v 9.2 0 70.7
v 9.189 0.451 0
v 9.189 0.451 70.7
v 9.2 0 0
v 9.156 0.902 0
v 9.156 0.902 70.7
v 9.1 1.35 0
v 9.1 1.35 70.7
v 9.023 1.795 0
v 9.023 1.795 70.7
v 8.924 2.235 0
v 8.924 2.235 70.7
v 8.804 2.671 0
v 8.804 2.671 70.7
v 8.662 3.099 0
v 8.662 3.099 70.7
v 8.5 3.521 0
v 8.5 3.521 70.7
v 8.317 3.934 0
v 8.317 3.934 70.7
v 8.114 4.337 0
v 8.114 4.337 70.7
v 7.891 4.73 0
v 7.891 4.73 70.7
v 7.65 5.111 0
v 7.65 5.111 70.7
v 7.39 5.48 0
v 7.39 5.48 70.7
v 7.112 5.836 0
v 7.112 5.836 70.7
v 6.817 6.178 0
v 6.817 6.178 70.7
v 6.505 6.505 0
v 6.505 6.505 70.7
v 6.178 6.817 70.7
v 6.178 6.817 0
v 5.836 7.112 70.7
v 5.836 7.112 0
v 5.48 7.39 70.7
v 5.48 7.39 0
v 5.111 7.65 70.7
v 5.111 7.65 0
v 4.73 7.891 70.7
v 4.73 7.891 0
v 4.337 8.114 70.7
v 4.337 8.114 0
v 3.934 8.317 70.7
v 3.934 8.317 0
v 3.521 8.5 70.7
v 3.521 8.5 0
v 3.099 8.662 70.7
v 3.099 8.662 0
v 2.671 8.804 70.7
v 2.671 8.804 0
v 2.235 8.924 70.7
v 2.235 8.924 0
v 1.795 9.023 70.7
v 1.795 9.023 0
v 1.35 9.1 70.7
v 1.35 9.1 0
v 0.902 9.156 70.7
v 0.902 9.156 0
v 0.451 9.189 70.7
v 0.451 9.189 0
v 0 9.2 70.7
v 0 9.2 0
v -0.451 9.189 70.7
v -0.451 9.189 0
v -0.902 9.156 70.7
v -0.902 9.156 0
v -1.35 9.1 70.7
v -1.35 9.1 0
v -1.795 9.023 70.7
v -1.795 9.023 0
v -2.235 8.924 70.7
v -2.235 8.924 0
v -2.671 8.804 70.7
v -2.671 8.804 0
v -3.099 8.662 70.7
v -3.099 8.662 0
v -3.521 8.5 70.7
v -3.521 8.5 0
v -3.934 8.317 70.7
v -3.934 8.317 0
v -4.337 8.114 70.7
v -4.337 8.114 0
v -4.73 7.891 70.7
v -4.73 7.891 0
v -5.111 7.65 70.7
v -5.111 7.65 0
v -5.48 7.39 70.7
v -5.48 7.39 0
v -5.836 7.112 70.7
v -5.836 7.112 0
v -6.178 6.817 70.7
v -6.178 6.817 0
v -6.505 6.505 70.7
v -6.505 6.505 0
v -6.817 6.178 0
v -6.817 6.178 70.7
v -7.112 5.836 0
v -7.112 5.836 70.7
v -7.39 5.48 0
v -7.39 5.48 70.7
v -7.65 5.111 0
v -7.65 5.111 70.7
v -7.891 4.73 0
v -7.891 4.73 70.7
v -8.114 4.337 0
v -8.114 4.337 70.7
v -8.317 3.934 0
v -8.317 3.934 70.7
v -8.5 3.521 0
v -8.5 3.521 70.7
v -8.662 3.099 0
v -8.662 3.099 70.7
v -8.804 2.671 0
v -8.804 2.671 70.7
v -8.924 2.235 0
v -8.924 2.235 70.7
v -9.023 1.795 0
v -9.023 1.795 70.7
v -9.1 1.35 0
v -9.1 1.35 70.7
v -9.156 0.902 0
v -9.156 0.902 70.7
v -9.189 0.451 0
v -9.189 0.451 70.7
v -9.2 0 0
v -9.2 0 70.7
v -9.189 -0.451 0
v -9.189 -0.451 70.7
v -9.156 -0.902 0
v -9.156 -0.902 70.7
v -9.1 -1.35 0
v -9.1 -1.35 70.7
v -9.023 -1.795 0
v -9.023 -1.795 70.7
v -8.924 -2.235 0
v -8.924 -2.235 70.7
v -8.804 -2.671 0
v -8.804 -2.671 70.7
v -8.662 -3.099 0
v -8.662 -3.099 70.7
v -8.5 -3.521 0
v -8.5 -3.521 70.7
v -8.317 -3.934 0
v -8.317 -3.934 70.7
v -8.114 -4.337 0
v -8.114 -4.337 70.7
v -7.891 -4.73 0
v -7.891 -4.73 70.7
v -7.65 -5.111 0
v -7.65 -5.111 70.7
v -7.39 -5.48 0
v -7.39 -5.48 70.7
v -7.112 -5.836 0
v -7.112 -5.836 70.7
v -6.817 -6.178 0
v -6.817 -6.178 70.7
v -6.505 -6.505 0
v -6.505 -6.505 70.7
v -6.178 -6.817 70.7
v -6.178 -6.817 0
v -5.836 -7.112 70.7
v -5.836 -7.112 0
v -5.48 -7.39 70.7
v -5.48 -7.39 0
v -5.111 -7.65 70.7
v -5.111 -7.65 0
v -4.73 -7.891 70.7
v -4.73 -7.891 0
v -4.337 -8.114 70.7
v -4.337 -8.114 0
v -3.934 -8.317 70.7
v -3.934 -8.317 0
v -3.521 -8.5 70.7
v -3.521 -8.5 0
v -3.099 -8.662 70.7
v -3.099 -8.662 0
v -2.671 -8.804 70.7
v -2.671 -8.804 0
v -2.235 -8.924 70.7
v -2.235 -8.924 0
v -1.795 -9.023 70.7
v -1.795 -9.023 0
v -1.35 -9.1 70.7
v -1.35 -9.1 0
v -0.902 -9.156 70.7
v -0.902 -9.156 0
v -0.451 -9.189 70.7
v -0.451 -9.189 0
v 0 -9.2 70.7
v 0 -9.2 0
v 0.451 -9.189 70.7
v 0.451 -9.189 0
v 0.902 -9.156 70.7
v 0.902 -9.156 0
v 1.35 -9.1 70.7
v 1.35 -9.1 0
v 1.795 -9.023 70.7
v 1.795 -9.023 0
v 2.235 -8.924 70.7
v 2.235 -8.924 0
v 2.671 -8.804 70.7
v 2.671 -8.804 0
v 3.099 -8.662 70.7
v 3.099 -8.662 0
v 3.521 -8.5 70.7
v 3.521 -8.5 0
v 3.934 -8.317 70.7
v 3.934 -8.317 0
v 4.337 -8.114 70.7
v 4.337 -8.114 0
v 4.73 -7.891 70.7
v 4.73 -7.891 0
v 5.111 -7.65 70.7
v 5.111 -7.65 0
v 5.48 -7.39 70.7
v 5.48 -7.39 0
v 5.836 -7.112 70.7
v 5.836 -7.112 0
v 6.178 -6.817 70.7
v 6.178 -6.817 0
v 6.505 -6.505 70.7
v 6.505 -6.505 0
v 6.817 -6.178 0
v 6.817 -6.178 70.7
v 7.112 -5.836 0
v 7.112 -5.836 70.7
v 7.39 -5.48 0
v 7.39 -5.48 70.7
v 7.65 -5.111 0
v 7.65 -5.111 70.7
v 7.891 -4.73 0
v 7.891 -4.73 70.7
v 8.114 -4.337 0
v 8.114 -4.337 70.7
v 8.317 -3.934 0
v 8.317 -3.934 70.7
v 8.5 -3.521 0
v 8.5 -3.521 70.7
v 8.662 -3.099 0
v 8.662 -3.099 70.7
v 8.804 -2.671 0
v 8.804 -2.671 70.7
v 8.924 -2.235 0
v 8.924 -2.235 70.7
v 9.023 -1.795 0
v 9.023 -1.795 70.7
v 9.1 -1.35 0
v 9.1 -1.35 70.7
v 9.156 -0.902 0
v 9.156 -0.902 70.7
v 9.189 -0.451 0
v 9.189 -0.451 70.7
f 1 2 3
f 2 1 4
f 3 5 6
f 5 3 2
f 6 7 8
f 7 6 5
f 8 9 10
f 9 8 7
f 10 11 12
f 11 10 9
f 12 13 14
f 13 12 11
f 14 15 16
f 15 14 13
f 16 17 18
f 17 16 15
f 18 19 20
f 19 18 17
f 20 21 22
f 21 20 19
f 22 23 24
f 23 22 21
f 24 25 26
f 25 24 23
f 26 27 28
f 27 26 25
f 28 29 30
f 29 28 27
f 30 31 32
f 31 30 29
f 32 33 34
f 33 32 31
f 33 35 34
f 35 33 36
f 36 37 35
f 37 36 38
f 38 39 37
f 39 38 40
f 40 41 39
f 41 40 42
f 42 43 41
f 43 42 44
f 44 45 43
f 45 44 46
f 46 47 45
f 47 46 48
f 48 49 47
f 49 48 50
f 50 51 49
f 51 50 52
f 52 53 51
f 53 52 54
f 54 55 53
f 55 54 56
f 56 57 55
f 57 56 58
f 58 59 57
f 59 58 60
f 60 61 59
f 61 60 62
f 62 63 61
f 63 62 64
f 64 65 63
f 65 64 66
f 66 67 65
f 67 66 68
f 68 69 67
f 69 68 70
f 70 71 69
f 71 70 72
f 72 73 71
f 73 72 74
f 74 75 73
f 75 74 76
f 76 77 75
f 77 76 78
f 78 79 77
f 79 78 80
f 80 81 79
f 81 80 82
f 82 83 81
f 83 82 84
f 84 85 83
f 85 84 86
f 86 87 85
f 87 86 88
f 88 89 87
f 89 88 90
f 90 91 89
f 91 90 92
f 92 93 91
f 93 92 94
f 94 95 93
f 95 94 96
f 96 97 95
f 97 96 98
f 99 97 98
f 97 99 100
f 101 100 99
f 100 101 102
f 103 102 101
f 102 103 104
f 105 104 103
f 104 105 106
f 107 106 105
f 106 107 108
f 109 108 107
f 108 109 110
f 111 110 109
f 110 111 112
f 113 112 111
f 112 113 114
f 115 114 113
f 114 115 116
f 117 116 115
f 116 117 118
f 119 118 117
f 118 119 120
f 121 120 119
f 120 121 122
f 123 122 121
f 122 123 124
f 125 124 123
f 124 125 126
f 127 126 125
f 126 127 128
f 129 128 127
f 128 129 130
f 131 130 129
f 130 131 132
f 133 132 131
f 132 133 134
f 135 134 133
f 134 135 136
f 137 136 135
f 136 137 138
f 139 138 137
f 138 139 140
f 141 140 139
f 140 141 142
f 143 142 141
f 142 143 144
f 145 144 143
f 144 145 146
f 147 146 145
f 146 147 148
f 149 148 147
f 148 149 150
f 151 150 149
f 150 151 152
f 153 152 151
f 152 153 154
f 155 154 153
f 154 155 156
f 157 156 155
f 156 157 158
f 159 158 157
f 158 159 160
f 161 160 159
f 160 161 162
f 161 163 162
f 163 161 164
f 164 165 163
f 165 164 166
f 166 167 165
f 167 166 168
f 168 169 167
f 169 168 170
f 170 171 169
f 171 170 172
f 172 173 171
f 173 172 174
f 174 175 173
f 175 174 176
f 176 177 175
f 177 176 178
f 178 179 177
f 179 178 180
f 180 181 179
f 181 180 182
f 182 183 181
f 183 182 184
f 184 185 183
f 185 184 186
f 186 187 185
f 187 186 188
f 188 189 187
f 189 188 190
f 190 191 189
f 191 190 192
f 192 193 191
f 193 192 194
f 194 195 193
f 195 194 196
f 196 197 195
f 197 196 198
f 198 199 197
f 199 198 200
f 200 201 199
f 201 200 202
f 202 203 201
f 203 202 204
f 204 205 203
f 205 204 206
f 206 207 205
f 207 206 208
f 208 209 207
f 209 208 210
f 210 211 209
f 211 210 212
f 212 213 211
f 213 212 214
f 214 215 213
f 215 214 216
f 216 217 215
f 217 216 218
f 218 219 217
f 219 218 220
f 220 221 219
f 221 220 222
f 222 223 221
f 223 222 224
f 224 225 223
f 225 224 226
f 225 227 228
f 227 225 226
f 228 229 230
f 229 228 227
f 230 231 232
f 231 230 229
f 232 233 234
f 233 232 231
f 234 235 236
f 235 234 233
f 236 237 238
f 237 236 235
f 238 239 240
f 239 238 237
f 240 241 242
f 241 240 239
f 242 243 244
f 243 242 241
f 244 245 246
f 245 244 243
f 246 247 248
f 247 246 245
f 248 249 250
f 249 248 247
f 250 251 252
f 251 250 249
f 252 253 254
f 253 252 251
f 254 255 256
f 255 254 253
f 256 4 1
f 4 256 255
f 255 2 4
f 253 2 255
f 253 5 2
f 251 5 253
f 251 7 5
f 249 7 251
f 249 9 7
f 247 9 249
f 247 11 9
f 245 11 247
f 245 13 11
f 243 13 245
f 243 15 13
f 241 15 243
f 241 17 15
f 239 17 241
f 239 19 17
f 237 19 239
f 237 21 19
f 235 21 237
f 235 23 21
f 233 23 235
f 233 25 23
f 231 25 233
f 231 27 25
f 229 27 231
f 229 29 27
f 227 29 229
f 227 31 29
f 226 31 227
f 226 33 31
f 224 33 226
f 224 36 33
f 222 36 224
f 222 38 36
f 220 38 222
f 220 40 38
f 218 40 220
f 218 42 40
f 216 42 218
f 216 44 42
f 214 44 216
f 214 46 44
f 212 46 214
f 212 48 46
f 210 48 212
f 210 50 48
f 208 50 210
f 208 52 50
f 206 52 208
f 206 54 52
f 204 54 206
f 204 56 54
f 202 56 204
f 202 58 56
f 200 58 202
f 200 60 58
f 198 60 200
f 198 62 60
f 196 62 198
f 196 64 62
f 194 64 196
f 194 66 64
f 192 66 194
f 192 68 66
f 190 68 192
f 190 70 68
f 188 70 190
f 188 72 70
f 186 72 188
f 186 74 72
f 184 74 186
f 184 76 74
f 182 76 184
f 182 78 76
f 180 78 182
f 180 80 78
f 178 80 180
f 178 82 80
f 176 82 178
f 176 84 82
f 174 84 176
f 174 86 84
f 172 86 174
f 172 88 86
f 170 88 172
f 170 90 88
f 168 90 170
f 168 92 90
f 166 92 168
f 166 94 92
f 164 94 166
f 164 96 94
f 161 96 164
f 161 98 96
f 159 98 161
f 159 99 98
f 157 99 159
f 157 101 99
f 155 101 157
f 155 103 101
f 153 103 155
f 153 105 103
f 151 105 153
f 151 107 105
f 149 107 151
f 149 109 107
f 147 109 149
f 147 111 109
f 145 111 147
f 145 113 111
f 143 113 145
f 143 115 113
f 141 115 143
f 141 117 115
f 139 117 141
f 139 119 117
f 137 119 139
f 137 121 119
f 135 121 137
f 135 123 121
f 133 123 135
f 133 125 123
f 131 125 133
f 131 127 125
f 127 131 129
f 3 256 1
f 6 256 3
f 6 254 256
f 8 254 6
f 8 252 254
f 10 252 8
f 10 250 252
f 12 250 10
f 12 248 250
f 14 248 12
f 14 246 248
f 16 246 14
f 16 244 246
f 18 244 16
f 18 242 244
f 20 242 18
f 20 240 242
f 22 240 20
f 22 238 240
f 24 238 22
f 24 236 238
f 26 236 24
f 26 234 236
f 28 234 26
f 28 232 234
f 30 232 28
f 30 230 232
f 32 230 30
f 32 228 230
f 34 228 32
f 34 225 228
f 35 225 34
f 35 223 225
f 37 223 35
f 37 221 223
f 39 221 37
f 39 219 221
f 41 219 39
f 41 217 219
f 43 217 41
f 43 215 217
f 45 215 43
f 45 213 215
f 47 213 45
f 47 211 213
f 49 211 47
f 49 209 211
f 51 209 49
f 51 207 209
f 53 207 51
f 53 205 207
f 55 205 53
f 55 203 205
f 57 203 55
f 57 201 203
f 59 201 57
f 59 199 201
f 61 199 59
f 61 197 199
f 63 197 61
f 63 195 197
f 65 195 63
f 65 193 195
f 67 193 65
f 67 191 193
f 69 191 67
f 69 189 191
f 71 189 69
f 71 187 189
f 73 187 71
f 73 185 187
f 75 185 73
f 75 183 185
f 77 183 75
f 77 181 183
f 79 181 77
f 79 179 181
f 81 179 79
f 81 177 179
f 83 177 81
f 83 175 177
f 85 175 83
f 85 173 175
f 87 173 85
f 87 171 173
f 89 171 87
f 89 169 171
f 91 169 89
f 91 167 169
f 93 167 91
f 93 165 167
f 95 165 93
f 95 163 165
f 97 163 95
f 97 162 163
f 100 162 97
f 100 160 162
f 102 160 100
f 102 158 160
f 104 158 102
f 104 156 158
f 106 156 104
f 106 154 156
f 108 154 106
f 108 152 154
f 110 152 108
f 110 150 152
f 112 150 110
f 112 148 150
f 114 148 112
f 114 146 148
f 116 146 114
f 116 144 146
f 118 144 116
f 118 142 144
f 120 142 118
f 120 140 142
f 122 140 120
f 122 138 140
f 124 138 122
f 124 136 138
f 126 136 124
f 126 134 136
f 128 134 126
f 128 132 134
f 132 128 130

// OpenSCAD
$fn = 128;

height = 70.7;
diameter = 18.4;

cylinder(h = height, d = diameter);
